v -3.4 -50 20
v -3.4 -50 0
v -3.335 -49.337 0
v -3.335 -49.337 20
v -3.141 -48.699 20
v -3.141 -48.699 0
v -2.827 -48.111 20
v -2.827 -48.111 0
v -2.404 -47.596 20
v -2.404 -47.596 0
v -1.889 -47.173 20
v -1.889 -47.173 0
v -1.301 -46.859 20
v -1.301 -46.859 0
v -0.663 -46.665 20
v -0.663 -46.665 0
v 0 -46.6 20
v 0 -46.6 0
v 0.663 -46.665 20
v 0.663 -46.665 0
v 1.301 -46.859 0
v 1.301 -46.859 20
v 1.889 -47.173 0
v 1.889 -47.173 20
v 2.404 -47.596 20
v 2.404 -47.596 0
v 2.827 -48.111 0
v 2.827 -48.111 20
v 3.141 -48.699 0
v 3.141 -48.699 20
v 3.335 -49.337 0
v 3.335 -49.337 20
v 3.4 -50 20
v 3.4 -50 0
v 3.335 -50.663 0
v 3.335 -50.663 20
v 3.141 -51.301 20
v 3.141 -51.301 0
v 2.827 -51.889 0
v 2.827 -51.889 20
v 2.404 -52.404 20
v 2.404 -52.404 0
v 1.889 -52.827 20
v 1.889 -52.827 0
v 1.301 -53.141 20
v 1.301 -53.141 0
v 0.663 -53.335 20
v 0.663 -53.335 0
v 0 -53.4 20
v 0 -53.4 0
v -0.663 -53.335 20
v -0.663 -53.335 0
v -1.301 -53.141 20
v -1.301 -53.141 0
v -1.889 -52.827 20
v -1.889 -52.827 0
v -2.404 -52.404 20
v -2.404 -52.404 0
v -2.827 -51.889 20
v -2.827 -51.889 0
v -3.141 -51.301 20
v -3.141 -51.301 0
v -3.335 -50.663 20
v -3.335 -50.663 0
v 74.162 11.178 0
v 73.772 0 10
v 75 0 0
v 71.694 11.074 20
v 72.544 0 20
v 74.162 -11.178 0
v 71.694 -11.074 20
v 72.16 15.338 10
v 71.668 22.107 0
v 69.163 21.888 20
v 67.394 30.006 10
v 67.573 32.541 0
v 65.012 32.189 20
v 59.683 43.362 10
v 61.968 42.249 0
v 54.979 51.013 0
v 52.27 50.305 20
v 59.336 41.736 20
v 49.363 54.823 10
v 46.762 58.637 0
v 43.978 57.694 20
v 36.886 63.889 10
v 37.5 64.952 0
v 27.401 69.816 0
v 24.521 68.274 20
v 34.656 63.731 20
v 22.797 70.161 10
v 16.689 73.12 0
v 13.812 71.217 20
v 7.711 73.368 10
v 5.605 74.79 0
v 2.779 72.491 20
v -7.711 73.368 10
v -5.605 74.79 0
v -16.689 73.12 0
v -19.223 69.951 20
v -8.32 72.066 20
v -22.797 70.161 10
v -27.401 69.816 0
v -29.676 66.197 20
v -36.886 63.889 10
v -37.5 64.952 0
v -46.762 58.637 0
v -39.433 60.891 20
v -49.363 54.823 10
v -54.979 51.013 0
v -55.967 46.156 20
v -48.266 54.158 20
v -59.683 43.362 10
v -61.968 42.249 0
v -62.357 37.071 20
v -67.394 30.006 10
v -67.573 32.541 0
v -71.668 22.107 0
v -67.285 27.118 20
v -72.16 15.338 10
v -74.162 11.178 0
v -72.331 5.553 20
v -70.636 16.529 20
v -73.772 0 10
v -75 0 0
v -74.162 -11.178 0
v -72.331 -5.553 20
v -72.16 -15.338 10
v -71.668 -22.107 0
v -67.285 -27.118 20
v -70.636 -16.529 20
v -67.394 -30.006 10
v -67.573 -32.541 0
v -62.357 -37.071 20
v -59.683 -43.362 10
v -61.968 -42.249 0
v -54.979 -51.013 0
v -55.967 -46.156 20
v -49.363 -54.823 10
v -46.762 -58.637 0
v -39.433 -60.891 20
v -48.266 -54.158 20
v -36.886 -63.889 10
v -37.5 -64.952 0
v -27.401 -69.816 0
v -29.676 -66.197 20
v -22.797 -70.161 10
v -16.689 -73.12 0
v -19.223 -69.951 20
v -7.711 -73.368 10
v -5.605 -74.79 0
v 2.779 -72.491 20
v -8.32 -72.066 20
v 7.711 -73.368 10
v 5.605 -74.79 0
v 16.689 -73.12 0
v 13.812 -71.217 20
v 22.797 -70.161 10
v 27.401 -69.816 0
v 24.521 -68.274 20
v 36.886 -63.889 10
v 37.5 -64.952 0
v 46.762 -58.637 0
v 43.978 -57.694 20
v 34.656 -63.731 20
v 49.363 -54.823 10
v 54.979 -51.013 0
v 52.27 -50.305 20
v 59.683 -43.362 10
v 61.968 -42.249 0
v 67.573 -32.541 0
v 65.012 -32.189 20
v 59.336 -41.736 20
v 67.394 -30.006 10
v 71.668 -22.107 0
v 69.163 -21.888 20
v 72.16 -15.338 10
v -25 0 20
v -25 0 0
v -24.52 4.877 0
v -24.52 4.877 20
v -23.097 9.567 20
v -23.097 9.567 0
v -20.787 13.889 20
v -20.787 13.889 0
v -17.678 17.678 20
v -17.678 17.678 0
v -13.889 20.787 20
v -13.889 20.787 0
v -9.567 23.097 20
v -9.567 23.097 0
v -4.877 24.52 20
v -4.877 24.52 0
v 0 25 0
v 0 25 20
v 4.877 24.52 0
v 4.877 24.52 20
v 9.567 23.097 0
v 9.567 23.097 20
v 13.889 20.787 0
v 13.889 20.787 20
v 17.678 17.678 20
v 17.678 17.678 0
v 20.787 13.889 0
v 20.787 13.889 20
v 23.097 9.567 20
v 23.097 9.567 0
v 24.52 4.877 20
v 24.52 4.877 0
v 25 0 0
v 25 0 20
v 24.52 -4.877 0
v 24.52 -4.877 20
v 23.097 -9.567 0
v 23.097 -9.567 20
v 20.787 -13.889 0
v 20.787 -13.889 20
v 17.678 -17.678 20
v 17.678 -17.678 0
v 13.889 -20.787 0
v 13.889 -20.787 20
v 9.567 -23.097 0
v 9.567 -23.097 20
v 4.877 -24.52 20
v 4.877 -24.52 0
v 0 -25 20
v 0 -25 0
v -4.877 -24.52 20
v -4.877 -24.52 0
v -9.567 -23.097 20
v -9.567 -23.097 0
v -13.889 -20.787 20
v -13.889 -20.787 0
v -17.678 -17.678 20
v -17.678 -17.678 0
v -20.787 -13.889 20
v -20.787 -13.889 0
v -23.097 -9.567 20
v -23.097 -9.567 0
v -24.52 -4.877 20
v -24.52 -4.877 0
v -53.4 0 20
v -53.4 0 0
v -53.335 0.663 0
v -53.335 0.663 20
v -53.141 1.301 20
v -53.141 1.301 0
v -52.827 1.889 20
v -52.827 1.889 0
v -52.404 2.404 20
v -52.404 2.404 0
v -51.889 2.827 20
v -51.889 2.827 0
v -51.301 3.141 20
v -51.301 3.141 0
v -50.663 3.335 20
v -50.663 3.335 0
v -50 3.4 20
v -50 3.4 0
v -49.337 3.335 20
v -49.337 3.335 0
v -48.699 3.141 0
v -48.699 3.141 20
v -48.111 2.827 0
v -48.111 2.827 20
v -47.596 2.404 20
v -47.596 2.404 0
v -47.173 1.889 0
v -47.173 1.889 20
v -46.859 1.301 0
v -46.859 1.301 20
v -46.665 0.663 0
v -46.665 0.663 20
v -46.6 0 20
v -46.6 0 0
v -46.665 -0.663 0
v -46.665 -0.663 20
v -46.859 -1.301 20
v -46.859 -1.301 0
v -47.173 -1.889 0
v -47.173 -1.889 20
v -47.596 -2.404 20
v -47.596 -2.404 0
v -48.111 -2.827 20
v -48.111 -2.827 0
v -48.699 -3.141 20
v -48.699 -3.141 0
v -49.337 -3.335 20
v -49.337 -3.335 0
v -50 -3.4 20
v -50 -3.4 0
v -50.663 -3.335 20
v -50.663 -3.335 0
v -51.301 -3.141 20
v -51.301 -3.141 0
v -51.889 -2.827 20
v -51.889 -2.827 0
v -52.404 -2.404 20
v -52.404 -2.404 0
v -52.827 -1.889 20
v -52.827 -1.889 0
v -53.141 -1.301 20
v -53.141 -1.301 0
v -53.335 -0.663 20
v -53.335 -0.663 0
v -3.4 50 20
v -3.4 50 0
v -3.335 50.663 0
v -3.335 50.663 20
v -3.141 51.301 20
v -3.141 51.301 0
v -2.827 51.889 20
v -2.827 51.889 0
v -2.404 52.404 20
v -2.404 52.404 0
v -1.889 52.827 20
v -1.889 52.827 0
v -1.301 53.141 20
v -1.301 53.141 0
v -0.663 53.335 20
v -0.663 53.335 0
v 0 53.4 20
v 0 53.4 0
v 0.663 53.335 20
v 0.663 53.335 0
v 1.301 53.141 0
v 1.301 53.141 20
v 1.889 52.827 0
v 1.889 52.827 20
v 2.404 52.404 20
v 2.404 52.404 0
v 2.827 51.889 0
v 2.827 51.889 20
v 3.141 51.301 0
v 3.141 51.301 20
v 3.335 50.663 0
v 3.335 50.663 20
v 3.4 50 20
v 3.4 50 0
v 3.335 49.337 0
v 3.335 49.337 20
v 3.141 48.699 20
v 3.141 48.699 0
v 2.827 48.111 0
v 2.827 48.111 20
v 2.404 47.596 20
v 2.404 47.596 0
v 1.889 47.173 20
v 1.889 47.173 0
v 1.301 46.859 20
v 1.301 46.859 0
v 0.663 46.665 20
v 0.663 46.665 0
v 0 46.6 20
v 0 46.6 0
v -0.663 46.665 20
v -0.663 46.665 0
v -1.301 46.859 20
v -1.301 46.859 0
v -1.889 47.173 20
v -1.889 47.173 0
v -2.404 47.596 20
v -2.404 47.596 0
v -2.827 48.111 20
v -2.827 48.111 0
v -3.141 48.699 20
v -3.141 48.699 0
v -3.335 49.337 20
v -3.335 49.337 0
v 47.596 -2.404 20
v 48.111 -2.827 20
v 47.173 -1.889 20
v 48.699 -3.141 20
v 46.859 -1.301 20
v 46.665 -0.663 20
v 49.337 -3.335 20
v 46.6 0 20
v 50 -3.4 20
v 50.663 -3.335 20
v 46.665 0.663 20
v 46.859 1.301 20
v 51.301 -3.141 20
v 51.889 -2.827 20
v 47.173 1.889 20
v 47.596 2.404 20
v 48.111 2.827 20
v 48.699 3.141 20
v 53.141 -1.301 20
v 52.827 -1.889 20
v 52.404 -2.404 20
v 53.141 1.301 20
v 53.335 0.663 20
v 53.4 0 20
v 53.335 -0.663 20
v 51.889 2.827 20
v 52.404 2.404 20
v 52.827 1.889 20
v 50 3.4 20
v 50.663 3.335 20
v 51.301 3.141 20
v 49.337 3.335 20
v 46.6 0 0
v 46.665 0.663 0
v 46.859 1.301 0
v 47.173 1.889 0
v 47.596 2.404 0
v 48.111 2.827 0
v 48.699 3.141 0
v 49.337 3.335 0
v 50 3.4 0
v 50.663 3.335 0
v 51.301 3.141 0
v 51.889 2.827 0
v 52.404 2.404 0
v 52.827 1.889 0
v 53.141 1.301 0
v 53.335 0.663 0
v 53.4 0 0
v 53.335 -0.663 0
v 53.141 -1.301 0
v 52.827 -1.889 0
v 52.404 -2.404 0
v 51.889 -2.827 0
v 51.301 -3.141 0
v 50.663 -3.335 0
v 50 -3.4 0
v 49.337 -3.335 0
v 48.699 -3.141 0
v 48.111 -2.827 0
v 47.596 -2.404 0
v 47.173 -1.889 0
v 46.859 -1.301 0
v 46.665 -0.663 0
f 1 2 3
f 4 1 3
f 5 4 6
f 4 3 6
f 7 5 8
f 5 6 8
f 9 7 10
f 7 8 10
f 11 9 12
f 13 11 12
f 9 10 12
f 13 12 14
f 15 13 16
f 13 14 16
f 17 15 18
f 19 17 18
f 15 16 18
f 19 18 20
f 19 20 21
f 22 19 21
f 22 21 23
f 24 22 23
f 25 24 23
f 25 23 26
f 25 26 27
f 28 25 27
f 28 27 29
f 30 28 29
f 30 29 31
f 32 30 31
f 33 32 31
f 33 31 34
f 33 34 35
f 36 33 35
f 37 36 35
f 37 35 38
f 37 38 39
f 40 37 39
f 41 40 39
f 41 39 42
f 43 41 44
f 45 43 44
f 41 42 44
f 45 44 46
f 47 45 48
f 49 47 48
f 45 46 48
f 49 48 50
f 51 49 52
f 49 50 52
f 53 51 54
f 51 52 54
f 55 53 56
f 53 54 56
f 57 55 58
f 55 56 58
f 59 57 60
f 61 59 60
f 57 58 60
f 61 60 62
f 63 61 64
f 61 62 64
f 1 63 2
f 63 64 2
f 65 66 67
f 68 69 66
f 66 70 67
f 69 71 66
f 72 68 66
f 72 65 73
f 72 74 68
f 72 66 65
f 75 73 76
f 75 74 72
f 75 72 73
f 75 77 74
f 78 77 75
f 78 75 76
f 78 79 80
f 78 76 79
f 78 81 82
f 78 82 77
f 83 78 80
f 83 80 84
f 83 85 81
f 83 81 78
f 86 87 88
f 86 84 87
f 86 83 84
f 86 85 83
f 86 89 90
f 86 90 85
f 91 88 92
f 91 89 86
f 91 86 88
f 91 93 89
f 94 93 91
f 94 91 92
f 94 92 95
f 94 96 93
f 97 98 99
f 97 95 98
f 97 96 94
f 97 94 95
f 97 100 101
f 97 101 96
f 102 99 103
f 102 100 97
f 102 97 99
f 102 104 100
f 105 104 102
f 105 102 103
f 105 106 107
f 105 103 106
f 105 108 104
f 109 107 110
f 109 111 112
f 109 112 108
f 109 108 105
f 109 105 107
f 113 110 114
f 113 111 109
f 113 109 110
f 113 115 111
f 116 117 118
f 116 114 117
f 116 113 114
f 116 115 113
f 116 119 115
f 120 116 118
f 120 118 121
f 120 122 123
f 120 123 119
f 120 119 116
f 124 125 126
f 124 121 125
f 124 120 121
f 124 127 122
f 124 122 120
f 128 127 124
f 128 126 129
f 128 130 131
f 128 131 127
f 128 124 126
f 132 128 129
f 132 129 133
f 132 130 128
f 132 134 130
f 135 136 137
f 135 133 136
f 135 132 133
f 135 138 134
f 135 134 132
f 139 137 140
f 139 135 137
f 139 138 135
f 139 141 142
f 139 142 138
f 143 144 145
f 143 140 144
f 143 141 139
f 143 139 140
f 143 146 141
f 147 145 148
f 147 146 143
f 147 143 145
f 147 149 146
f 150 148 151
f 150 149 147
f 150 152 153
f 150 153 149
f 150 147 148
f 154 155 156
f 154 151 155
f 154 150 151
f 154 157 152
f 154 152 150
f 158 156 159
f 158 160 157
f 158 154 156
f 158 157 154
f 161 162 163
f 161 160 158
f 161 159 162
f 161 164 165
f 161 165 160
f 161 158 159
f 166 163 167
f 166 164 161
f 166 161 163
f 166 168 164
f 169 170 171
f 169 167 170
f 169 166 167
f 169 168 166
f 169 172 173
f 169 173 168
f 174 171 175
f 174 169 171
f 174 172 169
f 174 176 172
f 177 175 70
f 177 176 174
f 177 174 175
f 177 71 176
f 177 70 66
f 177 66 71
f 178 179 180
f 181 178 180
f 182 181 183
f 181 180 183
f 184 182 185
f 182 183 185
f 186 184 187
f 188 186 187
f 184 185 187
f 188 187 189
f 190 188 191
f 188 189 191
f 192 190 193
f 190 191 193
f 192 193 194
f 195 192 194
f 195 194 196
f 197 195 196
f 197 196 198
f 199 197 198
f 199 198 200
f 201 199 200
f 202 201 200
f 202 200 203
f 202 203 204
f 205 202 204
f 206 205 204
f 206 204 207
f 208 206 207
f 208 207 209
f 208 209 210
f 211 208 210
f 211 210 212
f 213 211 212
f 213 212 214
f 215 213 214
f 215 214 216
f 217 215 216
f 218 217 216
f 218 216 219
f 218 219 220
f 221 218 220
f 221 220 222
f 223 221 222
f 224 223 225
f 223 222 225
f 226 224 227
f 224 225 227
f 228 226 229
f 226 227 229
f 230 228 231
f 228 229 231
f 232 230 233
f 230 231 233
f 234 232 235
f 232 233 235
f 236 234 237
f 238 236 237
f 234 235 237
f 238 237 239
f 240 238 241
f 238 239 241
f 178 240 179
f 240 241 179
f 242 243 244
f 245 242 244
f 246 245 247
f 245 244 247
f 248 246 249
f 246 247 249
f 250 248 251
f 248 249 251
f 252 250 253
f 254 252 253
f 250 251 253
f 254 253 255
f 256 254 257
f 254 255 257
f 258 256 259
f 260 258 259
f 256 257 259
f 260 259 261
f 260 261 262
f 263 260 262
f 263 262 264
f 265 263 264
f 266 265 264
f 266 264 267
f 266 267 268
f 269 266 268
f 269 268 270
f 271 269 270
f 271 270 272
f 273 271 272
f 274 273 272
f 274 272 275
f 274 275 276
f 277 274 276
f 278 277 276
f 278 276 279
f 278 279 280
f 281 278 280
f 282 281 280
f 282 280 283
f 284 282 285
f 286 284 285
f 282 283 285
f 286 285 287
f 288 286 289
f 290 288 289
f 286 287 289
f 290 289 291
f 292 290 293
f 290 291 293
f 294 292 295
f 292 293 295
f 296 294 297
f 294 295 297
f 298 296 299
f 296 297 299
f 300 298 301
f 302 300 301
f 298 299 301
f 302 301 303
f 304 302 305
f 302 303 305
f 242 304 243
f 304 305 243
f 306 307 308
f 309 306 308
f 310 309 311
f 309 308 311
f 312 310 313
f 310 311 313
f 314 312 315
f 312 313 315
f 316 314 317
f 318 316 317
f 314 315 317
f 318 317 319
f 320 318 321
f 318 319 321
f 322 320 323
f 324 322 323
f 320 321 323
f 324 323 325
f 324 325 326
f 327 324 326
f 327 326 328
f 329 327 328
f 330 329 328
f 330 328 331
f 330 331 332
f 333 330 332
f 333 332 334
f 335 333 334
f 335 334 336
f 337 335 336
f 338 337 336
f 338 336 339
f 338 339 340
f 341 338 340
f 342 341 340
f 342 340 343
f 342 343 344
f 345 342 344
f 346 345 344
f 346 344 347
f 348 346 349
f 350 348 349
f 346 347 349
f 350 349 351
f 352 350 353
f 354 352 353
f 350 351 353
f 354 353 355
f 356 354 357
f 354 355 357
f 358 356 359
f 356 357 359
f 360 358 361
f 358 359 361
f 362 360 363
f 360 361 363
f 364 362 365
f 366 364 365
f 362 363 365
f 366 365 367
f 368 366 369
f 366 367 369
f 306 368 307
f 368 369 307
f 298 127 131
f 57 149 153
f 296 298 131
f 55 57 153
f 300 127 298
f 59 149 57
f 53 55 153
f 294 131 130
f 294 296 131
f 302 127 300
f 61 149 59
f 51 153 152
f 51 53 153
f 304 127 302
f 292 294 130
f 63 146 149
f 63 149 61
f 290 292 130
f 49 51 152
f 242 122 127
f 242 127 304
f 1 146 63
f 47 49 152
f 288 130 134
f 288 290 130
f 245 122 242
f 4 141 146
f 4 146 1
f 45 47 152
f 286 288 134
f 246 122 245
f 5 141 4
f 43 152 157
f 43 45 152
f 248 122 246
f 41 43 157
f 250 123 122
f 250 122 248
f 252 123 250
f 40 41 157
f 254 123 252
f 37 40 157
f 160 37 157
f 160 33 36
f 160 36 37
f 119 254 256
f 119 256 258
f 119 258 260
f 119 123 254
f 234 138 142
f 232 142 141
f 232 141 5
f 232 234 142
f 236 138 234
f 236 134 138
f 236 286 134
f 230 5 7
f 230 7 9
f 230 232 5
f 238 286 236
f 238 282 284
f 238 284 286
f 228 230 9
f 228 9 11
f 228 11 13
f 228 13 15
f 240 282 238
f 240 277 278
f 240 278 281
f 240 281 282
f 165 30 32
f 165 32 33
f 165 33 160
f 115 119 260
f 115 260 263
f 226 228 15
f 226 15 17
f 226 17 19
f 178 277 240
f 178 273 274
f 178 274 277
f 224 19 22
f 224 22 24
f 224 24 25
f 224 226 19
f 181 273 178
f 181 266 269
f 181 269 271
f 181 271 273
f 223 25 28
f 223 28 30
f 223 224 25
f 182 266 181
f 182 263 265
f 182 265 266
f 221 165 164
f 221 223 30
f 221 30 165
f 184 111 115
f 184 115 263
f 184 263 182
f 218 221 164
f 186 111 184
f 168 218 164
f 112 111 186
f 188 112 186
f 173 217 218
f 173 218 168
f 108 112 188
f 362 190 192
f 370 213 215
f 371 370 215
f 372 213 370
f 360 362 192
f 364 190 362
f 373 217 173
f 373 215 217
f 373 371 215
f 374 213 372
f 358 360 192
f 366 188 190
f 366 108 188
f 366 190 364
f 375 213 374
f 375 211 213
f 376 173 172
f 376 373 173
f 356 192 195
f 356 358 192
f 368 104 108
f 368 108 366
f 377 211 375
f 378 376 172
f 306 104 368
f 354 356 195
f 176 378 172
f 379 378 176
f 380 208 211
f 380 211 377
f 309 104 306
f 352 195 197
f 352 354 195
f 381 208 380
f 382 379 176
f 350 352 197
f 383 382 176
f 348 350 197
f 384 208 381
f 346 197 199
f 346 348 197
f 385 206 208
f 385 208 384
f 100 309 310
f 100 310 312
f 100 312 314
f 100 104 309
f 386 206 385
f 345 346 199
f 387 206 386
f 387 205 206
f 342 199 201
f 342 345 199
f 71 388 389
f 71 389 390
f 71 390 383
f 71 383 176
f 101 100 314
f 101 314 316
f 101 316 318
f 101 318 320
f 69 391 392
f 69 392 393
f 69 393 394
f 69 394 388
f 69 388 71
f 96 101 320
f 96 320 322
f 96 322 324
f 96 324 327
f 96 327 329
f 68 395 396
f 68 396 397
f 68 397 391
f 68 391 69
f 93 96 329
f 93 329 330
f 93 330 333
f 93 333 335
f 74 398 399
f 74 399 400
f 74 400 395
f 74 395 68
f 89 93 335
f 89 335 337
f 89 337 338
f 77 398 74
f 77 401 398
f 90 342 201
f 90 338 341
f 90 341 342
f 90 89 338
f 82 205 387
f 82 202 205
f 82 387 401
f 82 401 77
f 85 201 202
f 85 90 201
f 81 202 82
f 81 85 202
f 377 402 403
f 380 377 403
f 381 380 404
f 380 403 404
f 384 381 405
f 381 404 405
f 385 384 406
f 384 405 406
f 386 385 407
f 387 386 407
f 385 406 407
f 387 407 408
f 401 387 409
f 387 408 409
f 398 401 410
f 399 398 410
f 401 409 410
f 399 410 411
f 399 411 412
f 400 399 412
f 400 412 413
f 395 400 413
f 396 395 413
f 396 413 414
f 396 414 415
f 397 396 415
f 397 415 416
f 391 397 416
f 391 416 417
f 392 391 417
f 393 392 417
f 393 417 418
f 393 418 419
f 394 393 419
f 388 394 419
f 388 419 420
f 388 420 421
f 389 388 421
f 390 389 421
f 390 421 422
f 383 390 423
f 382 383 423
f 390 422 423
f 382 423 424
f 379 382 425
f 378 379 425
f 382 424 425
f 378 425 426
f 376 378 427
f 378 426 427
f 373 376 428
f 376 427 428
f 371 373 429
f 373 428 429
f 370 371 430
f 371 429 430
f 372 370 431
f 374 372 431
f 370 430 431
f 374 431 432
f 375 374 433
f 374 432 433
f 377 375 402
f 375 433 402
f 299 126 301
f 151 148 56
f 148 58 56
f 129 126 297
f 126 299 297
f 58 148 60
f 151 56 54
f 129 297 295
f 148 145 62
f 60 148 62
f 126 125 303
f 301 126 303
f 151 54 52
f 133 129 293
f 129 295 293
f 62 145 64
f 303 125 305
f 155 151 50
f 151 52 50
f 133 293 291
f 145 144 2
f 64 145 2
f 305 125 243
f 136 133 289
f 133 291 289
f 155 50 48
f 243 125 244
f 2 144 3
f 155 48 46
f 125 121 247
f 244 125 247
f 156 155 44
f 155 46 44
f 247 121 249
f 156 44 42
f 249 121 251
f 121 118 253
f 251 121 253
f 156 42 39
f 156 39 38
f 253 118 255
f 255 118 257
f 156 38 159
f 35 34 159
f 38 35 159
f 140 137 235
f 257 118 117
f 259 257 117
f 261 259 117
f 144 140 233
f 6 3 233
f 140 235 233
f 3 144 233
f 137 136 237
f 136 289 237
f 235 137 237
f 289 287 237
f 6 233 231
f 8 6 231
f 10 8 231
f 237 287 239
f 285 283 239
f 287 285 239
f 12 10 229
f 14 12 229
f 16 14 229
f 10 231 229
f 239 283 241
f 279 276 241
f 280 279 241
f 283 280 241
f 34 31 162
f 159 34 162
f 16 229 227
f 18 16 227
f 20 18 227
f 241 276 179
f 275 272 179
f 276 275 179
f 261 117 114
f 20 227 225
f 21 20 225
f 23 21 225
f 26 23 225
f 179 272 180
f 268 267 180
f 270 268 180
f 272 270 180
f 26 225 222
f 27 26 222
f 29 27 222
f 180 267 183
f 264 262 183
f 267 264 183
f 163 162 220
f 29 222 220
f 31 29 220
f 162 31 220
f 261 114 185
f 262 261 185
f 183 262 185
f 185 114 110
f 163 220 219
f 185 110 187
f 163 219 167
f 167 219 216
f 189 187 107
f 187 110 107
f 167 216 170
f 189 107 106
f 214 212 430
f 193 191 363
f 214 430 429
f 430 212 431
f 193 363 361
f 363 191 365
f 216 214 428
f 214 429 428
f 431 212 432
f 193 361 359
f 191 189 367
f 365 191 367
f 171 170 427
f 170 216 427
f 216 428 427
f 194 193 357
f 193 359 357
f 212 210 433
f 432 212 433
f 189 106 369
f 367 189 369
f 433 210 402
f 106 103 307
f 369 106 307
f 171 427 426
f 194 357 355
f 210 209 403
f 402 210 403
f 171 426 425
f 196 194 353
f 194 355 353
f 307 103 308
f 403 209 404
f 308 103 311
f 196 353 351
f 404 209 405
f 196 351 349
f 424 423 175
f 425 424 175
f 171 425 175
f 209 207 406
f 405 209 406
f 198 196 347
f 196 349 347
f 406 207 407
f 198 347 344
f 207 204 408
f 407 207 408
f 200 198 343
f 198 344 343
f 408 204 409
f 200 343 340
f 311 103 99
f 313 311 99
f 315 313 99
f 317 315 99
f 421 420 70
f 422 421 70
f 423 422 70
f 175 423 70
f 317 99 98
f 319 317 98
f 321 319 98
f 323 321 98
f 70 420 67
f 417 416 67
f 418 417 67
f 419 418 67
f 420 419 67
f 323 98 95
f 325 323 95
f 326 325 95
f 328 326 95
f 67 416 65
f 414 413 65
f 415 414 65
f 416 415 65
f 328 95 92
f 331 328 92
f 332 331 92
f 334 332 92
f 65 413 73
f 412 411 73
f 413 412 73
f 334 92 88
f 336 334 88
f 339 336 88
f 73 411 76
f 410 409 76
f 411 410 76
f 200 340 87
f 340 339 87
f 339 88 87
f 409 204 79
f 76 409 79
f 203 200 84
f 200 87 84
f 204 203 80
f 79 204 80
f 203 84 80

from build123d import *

# Parameters (mm, degrees)
SKETCH1_R           = 75
BOSS_EXTRUDE1_DEPTH = 20
BOSS_EXTRUDE1_TAPER = 7
SKETCH6_R           = 25
SKETCH6_R_2         = 3.4
CUT_EXTRUDE1_DEPTH  = 21


with BuildPart() as part:
    # Sketch1 → Boss-Extrude1 (new body)
    with BuildSketch(Plane.XY):
        Circle(SKETCH1_R)
    extrude(amount=BOSS_EXTRUDE1_DEPTH, taper=BOSS_EXTRUDE1_TAPER)

    # Sketch6 → Cut-Extrude1 (cut, through all)
    with BuildSketch(Plane(origin=(0, 0, 0), x_dir=(-1, 0, 0), z_dir=(0, 0, -1))):
        Circle(SKETCH6_R)
        with Locations((0, 50)):
            Circle(SKETCH6_R_2)
        with Locations((50, 0)):
            Circle(SKETCH6_R_2)
        with Locations((0, -50)):
            Circle(SKETCH6_R_2)
        with Locations((-50, 0)):
            Circle(SKETCH6_R_2)
    extrude(amount=-CUT_EXTRUDE1_DEPTH, mode=Mode.SUBTRACT)


solid = part.part
